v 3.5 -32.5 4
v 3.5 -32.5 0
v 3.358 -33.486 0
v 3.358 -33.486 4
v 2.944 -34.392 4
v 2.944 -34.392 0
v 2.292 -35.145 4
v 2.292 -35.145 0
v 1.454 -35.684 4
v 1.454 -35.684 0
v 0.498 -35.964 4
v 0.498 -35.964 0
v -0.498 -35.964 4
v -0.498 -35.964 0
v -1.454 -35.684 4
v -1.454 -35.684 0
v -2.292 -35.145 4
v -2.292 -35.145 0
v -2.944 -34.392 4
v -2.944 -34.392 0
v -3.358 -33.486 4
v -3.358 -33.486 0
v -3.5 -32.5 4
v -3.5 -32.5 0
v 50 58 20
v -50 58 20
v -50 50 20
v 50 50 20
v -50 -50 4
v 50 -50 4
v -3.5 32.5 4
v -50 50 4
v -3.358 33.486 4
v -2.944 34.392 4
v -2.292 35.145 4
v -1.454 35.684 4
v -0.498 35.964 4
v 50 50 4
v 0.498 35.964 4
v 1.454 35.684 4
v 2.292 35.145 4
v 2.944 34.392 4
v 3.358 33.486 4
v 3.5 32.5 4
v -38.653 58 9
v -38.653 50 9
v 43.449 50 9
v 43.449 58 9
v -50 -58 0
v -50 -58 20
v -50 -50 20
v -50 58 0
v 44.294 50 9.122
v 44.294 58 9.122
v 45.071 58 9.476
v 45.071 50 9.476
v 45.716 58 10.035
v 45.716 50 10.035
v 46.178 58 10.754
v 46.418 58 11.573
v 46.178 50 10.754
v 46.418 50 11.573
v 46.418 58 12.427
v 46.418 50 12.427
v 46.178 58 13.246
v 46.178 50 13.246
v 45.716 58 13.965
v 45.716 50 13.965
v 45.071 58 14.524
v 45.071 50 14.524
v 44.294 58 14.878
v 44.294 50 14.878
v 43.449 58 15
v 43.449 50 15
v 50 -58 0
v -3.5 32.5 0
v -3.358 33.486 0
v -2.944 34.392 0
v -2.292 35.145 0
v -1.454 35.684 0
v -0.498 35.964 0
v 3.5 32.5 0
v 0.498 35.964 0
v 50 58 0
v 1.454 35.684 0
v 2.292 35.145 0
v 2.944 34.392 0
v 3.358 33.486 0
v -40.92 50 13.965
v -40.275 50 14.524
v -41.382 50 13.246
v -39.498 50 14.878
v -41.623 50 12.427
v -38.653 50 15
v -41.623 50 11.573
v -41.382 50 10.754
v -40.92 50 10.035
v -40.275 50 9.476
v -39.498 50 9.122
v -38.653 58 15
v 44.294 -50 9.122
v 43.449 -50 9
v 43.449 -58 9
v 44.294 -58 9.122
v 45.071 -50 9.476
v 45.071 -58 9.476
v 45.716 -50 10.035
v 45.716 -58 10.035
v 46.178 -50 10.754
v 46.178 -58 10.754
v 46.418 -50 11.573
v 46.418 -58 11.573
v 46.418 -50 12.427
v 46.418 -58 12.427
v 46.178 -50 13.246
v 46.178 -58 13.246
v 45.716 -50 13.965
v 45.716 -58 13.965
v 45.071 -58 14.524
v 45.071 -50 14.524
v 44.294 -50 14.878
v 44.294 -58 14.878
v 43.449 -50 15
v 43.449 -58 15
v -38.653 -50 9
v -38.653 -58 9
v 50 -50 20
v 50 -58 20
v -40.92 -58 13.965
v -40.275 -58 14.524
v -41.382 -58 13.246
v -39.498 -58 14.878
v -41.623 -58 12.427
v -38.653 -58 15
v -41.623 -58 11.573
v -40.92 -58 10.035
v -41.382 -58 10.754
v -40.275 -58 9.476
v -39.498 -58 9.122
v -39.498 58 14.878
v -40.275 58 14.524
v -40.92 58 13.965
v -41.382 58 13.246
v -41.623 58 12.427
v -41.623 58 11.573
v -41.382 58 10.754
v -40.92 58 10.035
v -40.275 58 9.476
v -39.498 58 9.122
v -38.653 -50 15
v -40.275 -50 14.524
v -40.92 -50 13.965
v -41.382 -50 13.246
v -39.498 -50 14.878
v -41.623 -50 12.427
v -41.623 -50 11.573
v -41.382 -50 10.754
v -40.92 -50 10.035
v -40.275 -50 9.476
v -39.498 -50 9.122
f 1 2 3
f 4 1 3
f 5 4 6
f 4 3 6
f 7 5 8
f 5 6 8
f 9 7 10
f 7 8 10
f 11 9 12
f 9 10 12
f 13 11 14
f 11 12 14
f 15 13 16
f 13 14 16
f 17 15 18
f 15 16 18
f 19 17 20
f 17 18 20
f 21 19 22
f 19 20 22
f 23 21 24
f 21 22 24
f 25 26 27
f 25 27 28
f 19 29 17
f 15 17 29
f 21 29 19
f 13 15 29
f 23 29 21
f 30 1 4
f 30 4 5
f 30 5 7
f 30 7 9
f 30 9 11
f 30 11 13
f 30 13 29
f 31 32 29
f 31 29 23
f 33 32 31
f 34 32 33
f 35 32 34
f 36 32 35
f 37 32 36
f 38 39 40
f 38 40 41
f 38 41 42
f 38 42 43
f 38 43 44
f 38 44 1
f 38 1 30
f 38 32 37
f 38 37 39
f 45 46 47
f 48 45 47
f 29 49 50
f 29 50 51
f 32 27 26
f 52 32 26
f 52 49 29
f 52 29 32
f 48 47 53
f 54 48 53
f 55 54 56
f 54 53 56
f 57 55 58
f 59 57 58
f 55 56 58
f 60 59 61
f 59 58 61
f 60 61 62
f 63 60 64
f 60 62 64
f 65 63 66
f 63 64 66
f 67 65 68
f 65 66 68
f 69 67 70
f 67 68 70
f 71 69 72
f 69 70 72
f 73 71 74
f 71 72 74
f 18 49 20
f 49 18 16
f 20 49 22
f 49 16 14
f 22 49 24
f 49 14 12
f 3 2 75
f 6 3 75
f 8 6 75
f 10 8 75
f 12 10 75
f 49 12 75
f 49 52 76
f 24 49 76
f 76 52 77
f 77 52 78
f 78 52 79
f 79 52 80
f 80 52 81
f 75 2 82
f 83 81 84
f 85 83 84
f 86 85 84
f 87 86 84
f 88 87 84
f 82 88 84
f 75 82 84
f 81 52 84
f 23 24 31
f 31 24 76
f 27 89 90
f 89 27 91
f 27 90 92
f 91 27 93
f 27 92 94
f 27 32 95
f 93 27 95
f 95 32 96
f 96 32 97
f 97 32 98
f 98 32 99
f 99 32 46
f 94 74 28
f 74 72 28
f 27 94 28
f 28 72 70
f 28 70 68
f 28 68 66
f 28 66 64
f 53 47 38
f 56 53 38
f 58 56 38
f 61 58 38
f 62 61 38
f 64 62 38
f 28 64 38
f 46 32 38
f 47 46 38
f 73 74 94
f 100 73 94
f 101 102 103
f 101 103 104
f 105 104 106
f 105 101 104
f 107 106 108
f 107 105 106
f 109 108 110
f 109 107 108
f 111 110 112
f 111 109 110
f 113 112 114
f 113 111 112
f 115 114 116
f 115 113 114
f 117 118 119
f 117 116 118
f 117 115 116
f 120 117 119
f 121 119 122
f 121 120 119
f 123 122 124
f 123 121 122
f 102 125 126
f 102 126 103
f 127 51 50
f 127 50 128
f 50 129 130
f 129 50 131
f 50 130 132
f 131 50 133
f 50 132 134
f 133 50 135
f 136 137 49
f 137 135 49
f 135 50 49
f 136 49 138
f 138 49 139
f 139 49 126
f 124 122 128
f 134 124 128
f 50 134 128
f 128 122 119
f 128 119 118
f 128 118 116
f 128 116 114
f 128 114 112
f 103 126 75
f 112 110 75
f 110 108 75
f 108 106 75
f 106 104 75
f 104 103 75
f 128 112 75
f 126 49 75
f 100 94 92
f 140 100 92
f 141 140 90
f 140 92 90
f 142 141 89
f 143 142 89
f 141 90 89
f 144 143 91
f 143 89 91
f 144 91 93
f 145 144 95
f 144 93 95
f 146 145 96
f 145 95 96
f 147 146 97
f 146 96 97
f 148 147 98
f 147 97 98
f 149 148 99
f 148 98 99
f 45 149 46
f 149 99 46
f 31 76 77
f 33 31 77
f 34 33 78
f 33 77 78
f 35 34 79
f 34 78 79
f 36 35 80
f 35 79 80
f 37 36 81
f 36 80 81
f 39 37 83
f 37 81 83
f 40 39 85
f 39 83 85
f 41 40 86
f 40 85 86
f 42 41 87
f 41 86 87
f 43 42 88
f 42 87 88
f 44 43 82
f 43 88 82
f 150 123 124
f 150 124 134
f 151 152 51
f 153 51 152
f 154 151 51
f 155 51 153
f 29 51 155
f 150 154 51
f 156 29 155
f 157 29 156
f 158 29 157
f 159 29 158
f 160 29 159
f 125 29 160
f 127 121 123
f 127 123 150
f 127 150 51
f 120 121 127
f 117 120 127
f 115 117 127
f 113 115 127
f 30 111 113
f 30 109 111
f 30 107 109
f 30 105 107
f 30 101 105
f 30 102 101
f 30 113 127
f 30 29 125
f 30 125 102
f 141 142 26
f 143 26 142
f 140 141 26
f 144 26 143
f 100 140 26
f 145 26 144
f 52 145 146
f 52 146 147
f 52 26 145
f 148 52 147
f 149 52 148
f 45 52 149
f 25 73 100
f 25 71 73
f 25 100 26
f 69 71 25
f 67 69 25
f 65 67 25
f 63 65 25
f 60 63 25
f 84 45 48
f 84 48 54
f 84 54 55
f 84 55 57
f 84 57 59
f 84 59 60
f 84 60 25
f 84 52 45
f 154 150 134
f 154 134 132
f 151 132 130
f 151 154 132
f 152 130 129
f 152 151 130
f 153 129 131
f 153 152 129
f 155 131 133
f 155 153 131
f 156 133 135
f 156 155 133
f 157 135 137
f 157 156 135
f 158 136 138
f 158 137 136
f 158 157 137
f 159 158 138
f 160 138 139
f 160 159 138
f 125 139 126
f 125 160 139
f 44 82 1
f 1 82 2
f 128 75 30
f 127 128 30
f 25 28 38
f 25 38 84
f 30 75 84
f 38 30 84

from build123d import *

# Parameters (mm, degrees)
F0_W          = 100
F0_H          = 100
F1_DEPTH      = 4
F2_W          = 100
F2_H          = 8
F3_DEPTH      = 20
F5_DEPTH      = 58.001
F5_DEPTH_BACK = 58.001


with BuildPart() as f1:
    # F0 (on Top) → F1 (new body)
    with BuildSketch(Plane.XY):
        Rectangle(F0_W, F0_H)
        with BuildLine():
            Line((3.5, 32.5), (3.5, -32.5))
            ThreePointArc((3.5, -32.5), (0, -36), (-3.5, -32.5))
            Line((-3.5, -32.5), (-3.5, 32.5))
            ThreePointArc((-3.5, 32.5), (0, 36), (3.5, 32.5))
        make_face(mode=Mode.SUBTRACT)
    extrude(amount=F1_DEPTH)

    # F2 (on Top) → F3 (join)
    with BuildSketch(Plane.XY):
        with Locations((0, 54)):
            Rectangle(F2_W, F2_H)
        with Locations((0, -54)):
            Rectangle(F2_W, F2_H)
    extrude(amount=F3_DEPTH)

    # F4 (on Front) → F5 (cut, two sides)
    with BuildSketch(Plane.XZ) as f5_sk:
        with BuildLine():
            ThreePointArc((-38.6532023549, 15), (-41.6532023549, 12), (-38.6532023549, 9))
            Line((-38.6532023549, 9), (43.4487722814, 9))
            ThreePointArc((43.4487722814, 9), (46.4487722814, 12), (43.4487722814, 15))
            Line((43.4487722814, 15), (-38.6532023549, 15))
        make_face()
    extrude(amount=-F5_DEPTH, mode=Mode.SUBTRACT)
    extrude(f5_sk.sketch, amount=F5_DEPTH_BACK, mode=Mode.SUBTRACT)


solid = f1.part
